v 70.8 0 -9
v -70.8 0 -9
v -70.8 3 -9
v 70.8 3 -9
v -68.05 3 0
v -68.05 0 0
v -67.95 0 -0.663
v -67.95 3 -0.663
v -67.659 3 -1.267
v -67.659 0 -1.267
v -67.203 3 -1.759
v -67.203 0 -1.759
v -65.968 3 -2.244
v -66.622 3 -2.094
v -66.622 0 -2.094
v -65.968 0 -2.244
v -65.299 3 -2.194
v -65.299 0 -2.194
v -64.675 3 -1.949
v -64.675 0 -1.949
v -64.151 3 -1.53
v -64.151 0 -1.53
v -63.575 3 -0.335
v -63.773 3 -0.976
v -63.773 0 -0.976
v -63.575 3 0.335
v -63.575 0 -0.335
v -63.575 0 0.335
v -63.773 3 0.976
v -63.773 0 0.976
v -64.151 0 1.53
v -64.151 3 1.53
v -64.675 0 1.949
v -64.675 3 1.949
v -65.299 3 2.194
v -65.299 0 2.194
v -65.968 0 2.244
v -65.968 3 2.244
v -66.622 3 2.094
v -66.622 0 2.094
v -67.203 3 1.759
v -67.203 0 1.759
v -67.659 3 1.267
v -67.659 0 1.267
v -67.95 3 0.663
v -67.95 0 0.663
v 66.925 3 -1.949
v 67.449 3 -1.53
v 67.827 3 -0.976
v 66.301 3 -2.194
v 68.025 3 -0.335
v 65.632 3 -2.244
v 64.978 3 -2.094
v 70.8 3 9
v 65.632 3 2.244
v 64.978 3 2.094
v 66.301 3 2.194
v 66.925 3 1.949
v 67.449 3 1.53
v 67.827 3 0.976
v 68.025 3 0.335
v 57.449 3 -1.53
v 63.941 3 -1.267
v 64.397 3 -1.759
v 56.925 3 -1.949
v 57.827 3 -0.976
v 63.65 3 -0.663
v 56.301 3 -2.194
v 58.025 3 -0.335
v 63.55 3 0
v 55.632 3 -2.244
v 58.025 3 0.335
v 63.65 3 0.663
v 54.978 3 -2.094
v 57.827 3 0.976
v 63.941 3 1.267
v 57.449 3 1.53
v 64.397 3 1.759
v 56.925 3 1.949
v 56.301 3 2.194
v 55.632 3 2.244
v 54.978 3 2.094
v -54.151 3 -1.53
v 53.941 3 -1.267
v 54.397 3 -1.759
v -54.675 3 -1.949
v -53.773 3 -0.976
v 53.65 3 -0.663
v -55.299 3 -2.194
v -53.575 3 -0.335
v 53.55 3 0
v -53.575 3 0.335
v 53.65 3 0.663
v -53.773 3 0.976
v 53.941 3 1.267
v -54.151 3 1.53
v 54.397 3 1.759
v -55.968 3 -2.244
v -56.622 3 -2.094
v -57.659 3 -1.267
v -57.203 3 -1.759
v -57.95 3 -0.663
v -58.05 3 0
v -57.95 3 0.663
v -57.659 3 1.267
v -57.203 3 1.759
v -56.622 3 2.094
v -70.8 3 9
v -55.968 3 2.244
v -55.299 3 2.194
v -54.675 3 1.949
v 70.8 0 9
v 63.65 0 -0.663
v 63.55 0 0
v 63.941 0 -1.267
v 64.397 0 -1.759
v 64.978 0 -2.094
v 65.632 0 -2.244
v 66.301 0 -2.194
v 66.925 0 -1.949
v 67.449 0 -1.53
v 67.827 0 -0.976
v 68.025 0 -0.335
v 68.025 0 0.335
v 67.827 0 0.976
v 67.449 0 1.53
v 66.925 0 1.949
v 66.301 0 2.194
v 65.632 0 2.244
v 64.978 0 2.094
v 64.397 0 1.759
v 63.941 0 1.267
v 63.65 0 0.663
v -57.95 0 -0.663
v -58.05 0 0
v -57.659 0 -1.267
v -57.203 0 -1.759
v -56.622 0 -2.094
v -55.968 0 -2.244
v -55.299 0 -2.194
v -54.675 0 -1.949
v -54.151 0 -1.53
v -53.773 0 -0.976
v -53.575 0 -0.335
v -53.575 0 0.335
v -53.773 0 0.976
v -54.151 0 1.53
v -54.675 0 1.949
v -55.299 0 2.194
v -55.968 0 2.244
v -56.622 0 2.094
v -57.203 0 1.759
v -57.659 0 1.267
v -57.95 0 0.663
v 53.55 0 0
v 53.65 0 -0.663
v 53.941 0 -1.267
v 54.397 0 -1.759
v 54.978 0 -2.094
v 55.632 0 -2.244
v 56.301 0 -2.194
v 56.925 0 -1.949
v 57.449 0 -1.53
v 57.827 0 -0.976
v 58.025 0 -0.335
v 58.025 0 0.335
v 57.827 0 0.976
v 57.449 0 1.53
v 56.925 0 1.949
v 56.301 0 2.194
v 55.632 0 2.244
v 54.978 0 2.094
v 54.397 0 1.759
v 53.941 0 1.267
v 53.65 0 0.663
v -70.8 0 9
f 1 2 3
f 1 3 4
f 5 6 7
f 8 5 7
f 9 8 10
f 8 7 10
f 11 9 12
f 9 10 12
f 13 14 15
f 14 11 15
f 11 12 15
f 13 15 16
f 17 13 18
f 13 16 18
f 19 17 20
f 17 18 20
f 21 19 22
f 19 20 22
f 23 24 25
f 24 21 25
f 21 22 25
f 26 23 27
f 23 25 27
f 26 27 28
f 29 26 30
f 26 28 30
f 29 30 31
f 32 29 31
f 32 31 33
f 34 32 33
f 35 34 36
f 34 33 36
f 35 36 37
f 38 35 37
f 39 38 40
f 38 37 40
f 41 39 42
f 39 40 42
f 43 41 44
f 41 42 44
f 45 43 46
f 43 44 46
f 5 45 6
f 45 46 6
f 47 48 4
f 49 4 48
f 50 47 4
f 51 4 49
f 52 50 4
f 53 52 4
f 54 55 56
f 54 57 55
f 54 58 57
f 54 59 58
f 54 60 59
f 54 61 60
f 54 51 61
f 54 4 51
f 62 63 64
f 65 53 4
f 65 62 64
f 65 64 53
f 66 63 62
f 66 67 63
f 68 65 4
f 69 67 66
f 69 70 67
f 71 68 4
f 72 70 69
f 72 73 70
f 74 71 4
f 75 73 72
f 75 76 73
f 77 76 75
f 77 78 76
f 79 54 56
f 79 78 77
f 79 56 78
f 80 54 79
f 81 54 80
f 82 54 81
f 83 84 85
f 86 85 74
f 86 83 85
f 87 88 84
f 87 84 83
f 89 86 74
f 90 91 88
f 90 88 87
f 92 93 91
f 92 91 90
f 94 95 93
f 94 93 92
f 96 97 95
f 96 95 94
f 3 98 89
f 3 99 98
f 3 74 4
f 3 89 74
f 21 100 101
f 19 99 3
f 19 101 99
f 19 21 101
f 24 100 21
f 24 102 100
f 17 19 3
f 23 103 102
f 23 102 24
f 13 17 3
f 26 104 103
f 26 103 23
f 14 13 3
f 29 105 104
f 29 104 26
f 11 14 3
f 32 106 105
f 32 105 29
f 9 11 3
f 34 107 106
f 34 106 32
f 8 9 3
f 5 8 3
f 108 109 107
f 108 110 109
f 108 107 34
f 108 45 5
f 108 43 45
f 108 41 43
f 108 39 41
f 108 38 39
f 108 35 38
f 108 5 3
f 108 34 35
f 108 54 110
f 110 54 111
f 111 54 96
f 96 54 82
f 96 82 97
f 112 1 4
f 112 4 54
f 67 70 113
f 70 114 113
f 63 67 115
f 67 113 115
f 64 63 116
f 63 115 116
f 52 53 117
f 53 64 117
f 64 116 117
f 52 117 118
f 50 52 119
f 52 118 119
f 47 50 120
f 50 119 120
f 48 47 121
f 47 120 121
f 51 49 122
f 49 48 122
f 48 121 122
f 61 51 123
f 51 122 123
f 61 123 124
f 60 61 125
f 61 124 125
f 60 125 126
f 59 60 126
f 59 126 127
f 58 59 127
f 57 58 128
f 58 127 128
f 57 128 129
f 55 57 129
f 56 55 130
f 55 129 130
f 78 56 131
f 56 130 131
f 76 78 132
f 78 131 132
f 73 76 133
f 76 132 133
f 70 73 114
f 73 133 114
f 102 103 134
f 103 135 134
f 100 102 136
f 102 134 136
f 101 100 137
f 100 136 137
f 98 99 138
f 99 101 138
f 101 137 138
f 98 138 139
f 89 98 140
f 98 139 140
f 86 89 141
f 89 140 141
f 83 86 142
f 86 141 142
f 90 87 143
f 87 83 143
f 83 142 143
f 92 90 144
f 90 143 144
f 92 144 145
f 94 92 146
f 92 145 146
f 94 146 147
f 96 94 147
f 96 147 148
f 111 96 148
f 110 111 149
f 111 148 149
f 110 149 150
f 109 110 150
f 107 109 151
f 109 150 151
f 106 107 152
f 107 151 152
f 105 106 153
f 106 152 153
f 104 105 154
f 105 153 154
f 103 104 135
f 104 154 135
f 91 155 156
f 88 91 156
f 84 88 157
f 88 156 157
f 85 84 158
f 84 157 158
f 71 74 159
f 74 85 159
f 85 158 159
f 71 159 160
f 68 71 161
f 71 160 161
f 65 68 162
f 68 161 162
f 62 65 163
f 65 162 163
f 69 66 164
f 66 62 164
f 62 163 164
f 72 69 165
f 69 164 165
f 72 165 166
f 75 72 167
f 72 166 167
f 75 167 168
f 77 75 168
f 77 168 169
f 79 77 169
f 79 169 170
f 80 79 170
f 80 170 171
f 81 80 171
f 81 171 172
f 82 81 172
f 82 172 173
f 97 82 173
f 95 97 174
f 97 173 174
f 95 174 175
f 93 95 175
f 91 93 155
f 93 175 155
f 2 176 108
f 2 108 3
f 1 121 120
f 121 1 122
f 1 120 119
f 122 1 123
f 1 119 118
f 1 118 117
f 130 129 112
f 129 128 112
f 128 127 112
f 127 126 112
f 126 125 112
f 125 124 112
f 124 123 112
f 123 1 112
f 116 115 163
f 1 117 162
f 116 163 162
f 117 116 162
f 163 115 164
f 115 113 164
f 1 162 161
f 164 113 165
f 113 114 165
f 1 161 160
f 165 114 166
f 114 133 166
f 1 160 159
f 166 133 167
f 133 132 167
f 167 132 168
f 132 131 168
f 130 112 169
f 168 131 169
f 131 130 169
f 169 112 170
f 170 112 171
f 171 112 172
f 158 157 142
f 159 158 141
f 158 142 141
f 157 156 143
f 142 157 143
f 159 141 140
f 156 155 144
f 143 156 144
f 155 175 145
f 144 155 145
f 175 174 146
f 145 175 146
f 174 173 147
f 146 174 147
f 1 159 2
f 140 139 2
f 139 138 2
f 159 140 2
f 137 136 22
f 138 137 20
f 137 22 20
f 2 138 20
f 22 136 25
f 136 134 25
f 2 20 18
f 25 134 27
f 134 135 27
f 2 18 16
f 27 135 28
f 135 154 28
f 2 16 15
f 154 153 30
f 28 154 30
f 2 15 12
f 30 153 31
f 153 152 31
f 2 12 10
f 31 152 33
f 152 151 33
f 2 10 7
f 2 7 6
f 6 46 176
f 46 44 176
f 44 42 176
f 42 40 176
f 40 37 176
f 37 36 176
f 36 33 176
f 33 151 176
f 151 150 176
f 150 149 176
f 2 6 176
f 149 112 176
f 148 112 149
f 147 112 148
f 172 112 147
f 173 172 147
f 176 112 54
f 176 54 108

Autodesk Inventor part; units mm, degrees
ref_plane "YZ Plane" through (0, 0, 0) normal (1, 0, 0) x (0, 1, 0)
ref_plane "XZ Plane" through (0, 0, 0) normal (0, 1, 0) x (-1, 0, 0)
ref_plane "XY Plane" through (0, 0, 0) normal (0, 0, 1) x (1, 0, 0)
sketch "Sketch1" plane through (0, 0, 0) normal (0, 1, 0) x (-1, 0, 0)
  line L0 (-70.8, 9) -> (0, 9)
  line L1 (70.8, 9) -> (70.8, -9)
  line L2 (70.8, -9) -> (0, -9)
  line L3 (-70.8, -9) -> (-70.8, 9)
  line L4 (-70.8, 0) -> (70.8, 0) construction
  circle A0 centre (-65.8, 0) radius 2.25
  circle A1 centre (-55.8, 0) radius 2.25
  line L5 (0, 9) -> (70.8, 9)
  line L6 (0, -9) -> (-70.8, -9)
  line L7 (-50.8, 9) -> (-50.8, -9)
  line L8 (0, 37.7423) -> (0, -37.3462) construction
  circle A2 centre (65.8, 0) radius 2.25
  circle A3 centre (55.8, 0) radius 2.25
  line L9 (50.8, 9) -> (50.8, -9)
  point P0 (0, 0)
  dimension "d1" = 18
  dimension "d2" = 4.5
  dimension "d3" = 4.5
  dimension "d4" = 5
  dimension "d5" = 15
  dimension "d17" = 5
  dimension "d18" = 101.6
  dimension "d19" = 5
extrude "Extrusion1" add sketch "Sketch1" along normal blind 3
properties part number "TopSliderBar"
